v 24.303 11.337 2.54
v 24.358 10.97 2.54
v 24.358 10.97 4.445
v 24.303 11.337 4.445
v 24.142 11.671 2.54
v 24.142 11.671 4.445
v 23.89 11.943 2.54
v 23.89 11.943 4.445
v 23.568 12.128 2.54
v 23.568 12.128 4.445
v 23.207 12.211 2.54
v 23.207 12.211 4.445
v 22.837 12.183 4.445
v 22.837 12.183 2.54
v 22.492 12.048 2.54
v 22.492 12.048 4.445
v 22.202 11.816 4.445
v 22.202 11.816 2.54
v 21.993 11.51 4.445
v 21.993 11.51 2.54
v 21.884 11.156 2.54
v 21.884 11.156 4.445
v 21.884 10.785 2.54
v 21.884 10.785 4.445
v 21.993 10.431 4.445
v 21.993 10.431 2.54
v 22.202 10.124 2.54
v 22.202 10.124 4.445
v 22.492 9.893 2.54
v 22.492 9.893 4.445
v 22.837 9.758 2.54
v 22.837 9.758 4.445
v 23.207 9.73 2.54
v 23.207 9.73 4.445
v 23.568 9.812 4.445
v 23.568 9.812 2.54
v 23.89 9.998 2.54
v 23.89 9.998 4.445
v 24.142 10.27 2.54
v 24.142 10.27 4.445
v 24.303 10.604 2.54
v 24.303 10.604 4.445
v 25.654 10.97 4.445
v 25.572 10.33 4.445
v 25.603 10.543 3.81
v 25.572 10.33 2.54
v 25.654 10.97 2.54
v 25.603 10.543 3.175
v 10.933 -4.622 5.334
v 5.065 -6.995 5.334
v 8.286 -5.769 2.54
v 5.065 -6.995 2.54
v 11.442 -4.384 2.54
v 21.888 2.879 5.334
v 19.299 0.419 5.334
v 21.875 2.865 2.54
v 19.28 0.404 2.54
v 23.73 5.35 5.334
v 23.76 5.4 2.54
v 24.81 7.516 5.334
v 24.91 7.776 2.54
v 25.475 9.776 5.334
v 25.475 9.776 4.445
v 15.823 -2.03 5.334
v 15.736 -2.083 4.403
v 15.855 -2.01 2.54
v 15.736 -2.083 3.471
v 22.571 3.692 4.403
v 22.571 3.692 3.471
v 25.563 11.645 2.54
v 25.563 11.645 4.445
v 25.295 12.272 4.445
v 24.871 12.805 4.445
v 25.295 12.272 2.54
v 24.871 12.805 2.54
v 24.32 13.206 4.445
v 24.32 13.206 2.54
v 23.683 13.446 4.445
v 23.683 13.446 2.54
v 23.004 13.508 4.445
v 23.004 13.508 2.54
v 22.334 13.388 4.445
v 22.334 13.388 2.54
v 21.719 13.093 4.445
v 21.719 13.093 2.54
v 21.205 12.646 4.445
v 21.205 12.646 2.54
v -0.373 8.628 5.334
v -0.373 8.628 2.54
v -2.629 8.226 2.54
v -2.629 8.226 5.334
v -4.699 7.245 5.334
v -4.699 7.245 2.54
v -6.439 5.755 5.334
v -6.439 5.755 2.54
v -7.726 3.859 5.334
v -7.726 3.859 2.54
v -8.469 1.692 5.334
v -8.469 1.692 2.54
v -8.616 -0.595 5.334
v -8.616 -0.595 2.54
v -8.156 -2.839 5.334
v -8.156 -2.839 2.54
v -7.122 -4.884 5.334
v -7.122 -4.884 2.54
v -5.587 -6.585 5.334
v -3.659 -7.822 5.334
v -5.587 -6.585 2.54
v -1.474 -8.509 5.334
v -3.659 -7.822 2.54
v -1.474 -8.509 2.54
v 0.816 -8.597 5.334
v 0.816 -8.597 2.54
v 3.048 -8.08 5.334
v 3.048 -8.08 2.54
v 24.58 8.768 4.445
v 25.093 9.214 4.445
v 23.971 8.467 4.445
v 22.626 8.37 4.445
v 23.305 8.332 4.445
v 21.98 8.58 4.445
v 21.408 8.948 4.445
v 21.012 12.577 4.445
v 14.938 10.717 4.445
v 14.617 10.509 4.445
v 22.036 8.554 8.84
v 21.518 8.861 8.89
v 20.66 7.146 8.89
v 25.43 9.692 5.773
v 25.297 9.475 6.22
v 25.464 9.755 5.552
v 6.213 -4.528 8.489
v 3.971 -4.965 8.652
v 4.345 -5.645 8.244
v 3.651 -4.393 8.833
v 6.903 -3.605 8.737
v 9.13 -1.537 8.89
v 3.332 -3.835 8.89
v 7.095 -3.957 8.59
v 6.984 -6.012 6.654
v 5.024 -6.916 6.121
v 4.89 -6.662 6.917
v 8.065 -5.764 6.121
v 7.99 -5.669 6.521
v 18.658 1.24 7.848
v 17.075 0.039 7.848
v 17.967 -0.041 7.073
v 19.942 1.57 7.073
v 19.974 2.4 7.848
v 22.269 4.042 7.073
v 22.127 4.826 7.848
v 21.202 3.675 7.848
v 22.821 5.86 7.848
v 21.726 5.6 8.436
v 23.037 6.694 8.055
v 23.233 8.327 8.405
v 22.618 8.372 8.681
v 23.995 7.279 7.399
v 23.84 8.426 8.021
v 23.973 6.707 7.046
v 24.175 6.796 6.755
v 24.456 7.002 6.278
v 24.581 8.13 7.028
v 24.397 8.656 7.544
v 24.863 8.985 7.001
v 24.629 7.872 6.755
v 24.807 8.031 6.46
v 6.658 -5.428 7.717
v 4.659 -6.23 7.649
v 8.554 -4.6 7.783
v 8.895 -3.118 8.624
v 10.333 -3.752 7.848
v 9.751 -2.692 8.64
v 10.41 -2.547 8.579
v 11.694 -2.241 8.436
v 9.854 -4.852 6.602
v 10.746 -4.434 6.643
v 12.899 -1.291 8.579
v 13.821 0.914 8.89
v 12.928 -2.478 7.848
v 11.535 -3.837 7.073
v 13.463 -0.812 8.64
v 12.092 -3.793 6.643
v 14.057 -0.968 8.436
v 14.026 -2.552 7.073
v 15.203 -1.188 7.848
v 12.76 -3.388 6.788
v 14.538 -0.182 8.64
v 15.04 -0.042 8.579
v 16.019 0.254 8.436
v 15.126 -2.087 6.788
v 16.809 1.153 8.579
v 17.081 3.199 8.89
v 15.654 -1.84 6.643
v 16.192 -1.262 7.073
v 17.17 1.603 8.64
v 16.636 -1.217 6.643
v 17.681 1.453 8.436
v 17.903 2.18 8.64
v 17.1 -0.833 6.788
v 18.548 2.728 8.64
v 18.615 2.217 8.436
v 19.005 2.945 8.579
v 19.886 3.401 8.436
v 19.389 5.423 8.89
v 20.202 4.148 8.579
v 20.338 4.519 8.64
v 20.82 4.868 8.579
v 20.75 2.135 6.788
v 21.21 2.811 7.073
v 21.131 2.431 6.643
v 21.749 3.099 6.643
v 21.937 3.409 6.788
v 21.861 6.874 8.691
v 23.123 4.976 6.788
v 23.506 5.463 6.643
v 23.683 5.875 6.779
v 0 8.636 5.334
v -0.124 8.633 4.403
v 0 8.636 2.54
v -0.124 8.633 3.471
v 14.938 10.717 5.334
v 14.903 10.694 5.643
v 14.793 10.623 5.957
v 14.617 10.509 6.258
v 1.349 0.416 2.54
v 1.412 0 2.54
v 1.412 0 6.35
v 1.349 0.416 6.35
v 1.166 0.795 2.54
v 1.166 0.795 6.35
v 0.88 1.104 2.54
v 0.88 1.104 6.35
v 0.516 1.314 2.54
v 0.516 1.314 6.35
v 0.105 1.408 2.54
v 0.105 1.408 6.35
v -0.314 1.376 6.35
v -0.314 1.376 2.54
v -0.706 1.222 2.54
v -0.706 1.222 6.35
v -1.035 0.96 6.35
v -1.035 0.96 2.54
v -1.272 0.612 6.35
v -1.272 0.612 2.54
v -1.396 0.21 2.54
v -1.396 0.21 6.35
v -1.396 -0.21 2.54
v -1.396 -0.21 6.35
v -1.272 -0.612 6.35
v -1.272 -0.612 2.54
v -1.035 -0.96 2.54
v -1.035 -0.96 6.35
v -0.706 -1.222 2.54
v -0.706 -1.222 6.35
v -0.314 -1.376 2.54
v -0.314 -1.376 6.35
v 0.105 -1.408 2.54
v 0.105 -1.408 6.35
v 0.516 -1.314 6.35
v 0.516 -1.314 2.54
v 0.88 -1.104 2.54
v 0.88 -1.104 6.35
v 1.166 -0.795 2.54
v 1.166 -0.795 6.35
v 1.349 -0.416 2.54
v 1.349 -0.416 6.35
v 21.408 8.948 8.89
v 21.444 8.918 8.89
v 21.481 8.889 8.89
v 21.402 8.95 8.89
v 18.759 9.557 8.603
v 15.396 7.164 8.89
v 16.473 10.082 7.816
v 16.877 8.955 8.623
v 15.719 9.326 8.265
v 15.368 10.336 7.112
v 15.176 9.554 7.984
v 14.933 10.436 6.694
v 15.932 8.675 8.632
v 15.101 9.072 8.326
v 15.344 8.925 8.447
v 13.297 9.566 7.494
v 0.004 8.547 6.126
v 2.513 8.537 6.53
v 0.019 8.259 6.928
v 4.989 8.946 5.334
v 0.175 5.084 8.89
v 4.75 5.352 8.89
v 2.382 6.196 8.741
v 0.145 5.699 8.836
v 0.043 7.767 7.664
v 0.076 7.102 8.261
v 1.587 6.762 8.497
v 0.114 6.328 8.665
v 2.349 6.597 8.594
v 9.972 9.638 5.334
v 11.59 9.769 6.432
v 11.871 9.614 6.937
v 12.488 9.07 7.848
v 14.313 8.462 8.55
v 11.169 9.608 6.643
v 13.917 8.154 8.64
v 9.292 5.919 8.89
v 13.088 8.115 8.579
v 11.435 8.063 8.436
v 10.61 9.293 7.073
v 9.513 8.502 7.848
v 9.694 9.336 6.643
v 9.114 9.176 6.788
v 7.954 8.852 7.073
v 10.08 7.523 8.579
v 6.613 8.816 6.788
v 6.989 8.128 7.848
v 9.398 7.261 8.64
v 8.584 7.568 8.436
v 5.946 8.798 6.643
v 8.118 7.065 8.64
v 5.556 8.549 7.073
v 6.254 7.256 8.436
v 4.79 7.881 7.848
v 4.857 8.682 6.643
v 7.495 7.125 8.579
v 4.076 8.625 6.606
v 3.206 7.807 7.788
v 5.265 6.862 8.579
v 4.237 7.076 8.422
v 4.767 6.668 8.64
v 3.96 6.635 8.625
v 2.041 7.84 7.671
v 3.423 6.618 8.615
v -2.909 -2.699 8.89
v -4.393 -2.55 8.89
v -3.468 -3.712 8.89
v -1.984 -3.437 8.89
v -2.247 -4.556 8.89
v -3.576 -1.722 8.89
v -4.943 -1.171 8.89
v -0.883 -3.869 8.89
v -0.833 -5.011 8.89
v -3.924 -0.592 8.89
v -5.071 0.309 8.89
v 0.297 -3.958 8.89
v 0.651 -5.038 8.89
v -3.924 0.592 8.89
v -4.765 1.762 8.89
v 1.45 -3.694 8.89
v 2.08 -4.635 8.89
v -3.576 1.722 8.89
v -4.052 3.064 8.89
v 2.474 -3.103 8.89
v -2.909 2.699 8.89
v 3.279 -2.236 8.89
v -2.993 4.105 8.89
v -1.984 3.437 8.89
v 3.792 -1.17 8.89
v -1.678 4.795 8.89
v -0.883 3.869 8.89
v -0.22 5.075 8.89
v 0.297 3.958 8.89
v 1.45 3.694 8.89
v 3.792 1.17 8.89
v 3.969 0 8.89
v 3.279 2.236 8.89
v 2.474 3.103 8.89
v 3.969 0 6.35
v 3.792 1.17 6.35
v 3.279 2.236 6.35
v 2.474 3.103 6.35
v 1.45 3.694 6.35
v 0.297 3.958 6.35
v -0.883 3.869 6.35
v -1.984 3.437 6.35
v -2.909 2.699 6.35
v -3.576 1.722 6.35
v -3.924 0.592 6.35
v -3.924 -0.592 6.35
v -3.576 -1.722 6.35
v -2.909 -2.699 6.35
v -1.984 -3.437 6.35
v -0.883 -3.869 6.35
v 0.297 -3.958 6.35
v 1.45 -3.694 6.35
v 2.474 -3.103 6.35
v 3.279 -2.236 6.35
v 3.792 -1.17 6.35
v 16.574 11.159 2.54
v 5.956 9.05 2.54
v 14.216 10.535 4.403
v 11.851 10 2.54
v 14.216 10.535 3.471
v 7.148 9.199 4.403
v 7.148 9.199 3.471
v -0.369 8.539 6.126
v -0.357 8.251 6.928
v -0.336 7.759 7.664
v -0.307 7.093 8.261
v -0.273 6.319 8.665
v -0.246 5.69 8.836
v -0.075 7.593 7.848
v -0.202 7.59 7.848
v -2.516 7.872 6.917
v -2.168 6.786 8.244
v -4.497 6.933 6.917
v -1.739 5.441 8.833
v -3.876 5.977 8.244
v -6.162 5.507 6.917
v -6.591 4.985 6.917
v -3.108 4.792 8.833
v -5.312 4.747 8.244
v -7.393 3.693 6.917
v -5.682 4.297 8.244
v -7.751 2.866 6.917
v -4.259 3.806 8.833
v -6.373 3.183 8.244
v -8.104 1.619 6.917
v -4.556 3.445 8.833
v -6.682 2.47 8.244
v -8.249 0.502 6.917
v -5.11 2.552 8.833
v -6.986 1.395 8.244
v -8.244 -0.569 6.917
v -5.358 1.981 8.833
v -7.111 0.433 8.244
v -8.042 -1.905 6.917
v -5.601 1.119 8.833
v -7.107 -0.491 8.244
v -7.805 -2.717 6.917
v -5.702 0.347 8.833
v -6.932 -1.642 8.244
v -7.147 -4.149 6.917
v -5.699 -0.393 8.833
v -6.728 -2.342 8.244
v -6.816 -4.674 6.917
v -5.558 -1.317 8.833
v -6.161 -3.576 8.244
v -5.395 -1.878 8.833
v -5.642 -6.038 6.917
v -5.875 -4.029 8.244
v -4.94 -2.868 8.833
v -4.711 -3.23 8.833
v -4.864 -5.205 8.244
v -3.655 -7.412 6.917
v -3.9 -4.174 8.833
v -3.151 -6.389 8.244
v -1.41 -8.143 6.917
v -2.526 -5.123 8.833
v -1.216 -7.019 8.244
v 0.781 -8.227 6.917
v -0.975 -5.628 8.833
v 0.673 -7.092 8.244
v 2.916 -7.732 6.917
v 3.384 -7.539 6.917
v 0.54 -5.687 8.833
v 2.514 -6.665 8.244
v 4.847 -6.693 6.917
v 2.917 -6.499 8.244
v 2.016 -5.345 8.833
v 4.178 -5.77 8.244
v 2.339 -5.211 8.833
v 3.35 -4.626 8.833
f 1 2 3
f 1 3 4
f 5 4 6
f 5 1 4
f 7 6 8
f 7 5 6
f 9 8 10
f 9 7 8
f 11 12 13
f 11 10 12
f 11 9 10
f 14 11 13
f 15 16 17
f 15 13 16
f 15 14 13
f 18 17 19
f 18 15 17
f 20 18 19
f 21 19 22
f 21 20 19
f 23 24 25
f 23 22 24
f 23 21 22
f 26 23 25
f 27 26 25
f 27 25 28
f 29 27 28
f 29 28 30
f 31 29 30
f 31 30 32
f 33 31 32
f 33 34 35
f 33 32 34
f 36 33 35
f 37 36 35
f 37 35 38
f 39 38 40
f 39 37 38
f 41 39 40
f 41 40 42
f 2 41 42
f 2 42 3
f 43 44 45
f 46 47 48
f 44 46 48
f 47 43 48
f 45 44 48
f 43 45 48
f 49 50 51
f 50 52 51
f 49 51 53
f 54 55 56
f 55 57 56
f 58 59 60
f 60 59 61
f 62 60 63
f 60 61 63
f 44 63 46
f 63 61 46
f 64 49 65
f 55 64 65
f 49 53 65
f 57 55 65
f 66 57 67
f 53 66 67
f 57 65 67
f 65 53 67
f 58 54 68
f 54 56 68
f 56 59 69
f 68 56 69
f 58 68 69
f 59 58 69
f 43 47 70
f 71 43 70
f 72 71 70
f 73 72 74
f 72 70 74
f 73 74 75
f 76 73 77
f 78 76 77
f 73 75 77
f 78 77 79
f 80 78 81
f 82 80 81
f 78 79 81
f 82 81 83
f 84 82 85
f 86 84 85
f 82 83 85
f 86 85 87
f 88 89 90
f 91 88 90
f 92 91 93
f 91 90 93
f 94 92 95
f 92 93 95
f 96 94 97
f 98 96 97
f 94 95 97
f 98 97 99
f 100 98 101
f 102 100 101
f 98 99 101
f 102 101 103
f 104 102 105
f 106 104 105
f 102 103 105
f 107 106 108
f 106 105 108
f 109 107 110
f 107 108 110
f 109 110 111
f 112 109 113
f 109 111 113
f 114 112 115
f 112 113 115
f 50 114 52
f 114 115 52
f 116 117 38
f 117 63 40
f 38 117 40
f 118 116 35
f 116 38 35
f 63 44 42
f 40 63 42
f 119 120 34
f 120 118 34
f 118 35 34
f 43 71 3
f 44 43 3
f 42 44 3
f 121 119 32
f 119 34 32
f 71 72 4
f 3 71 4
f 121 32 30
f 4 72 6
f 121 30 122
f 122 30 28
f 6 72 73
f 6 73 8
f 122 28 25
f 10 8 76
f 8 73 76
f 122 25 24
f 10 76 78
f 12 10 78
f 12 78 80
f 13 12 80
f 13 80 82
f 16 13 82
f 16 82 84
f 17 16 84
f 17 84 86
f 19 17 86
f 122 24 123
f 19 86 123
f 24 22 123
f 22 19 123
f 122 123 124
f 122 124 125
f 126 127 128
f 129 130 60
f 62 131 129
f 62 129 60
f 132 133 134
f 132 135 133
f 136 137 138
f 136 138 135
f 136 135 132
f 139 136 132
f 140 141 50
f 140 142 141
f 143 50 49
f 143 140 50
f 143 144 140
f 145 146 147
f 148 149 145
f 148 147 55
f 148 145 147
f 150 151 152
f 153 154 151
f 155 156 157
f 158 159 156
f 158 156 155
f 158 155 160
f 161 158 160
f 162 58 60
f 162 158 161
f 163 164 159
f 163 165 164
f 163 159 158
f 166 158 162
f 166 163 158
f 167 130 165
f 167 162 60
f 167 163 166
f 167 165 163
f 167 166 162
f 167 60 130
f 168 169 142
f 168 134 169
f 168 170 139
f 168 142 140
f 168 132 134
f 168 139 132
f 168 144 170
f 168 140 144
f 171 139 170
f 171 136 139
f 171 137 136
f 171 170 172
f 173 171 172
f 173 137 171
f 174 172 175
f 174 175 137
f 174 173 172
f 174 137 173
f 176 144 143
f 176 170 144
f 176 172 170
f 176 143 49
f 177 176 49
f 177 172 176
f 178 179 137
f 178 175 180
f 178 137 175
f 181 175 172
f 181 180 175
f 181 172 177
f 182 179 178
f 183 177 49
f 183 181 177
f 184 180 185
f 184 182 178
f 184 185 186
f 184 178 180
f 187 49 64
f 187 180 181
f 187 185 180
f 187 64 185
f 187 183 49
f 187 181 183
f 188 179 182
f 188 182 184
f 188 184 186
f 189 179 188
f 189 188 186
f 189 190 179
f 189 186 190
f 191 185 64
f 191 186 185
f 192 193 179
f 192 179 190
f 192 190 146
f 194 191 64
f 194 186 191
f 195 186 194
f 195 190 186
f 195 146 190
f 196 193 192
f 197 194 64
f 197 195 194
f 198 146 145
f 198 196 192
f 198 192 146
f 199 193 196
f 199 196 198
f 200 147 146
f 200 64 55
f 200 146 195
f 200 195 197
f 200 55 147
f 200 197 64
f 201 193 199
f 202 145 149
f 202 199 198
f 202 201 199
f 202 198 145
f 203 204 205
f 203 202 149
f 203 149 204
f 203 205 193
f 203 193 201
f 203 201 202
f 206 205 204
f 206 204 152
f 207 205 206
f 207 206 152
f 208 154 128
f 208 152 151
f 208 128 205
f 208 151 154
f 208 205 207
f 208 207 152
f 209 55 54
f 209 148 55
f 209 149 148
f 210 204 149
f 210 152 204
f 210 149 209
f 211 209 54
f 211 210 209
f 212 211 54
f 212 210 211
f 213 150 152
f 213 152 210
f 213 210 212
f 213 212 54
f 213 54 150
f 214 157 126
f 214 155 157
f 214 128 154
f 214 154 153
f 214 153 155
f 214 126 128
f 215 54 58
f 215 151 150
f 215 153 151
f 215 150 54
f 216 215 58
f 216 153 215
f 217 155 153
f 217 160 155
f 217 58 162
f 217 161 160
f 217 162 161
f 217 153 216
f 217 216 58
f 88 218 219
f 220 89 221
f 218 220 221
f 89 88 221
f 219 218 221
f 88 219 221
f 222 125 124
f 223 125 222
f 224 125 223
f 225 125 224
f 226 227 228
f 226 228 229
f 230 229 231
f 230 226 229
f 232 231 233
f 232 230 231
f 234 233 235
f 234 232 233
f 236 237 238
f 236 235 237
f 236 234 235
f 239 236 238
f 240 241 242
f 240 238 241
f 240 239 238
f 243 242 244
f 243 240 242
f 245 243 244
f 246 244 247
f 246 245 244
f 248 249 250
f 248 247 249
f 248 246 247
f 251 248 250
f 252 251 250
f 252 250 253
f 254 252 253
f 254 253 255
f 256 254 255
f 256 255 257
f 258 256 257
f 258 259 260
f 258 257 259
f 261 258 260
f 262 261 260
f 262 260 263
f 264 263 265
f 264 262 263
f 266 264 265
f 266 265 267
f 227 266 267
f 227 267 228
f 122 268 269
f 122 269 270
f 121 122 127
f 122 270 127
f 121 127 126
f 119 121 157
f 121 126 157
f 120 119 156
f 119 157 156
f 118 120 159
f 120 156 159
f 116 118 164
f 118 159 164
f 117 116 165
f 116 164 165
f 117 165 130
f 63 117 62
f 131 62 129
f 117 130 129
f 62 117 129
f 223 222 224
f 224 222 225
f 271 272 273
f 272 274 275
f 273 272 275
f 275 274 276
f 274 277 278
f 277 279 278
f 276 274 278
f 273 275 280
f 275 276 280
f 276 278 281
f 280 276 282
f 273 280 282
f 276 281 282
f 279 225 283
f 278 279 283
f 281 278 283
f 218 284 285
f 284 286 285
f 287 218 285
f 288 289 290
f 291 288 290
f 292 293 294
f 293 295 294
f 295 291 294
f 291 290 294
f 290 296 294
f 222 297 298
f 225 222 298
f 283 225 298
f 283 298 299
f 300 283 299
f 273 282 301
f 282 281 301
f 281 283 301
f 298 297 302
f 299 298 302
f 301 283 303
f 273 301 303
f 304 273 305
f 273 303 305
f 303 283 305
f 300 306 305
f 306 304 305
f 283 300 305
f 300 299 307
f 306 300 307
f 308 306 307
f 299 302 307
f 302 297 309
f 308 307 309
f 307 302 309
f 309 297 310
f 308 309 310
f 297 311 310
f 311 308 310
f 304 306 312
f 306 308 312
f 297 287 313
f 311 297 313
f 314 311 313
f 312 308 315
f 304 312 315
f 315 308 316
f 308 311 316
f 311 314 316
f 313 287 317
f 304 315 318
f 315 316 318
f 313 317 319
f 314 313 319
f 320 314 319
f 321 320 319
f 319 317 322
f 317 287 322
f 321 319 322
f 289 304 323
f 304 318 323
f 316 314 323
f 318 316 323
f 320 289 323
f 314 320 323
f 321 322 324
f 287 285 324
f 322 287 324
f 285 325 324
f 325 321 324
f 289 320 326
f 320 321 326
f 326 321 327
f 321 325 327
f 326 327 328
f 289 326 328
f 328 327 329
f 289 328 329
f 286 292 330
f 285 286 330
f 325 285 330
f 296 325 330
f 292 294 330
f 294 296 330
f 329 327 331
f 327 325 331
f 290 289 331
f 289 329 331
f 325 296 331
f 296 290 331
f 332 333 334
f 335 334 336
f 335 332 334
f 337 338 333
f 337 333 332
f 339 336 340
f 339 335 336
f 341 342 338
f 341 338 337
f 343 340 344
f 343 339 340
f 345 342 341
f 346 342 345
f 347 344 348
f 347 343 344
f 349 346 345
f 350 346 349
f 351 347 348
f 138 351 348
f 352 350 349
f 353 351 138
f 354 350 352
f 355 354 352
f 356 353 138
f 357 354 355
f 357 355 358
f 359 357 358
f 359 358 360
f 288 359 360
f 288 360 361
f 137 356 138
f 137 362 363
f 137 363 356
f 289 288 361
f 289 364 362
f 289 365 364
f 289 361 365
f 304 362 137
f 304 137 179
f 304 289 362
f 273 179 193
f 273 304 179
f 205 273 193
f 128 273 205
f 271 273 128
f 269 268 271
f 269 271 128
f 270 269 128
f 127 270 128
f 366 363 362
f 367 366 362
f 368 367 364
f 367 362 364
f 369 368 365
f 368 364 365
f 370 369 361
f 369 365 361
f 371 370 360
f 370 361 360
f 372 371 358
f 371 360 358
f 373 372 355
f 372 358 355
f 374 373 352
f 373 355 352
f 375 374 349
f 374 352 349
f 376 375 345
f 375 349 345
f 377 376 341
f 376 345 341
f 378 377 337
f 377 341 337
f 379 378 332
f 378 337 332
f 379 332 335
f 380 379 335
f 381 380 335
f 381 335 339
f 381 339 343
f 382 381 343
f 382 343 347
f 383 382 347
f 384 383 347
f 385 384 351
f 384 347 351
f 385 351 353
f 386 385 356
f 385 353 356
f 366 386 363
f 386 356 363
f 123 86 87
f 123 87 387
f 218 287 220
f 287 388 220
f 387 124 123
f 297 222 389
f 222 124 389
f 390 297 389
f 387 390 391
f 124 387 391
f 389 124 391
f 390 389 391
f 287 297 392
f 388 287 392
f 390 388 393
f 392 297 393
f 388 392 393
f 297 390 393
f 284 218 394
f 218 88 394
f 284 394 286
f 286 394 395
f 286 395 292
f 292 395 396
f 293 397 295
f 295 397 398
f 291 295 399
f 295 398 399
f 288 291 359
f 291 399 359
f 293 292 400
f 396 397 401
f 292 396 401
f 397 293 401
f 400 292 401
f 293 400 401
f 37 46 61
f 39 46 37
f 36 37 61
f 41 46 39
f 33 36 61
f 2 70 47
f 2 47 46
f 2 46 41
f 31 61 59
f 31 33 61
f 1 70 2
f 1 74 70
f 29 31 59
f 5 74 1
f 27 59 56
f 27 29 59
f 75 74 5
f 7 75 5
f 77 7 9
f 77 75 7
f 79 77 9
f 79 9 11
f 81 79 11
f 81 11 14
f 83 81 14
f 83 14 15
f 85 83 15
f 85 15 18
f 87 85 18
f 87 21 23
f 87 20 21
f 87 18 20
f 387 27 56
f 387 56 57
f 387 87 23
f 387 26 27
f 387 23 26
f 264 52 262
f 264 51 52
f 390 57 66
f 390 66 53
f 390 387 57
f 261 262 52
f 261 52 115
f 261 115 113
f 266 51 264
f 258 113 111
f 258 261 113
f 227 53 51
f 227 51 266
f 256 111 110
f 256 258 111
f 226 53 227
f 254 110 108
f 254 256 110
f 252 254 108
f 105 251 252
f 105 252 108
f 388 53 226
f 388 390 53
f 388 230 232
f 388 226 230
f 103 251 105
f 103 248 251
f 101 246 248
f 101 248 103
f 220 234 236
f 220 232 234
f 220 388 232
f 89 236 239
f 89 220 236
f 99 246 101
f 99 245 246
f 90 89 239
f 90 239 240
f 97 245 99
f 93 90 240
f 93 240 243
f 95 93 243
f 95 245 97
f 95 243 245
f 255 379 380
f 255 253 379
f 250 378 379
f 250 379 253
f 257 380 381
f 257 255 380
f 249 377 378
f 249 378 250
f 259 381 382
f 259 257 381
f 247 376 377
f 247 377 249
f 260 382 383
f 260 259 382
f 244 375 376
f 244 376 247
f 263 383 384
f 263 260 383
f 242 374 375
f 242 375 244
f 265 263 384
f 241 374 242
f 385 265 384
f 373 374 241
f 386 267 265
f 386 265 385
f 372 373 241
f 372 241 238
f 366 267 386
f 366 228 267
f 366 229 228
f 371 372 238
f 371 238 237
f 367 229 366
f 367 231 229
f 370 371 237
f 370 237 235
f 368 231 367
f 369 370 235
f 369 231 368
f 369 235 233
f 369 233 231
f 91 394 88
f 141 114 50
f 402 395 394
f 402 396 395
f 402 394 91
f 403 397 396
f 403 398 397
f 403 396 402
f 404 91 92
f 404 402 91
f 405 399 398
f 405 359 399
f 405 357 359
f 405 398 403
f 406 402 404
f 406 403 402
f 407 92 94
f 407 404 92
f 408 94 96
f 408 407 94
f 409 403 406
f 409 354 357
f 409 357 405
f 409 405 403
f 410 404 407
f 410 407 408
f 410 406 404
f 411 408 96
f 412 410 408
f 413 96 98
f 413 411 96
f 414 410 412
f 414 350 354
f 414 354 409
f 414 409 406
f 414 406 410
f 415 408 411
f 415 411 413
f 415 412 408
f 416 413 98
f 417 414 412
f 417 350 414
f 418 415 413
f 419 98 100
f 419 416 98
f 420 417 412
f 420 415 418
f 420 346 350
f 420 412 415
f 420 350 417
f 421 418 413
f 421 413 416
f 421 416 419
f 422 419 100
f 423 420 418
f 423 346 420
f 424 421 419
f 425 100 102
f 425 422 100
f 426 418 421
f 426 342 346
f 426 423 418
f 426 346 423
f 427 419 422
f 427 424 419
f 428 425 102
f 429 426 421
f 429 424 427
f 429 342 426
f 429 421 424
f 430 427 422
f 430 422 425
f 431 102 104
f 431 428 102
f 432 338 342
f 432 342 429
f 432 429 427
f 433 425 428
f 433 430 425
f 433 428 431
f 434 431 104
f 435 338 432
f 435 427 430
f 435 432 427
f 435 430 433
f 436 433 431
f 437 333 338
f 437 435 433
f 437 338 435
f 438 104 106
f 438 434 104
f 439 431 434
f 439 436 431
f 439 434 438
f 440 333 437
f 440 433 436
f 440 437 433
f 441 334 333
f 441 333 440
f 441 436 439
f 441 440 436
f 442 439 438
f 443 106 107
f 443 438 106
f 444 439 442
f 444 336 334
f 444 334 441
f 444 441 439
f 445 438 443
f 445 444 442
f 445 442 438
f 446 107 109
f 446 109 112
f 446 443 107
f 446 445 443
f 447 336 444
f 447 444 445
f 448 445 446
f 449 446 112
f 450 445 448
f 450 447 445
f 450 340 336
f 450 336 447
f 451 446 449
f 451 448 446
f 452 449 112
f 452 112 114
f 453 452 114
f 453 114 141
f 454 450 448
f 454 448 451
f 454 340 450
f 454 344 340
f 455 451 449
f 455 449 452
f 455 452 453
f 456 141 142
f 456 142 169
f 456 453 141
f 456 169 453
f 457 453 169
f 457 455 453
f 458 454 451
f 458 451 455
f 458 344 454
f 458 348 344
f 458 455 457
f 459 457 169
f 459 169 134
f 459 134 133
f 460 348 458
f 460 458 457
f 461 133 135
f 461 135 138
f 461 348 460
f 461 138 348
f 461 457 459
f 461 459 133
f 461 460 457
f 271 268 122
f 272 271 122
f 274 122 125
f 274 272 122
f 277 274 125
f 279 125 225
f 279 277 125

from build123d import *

# Parameters (mm, degrees)
SKETCH1_R           = 1.411527177
SKETCH1_R_2         = 1.243983369
BOSS_EXTRUDE1_DEPTH = 8.89
SKETCH2_R           = 2.645579886
CUT_EXTRUDE1_DEPTH  = 4.445
FILLET1_R           = 3.556
SKETCH3_W           = 44.674996293
SKETCH3_H           = 31.668439698
CUT_EXTRUDE2_DEPTH  = 2.54
SKETCH4_R           = 3.96875
CUT_EXTRUDE3_DEPTH  = 2.54
CUT_EXTRUDE7_DEPTH  = 4.445


with BuildPart() as part:
    # Sketch1 → Boss-Extrude1 (new body)
    with BuildSketch(Plane.XY):
        with BuildLine():
            add(Edge.make_bspline(
                [(21.205268726, 12.646161991), (14.255823247, 10.148268513), (7.187400407, 8.811547849), (0, 8.636)],
                knots=[0.085210597, 0.085210597, 0.085210597, 0.085210597, 0.879863224, 0.879863224, 0.879863224, 0.879863224], degree=3))
            add(Edge.make_bspline(
                [(0, 8.636), (-0.12439204, 8.632961801), (-0.248819718, 8.630271408), (-0.373283033, 8.627928823)],
                knots=[0.879863224, 0.879863224, 0.879863224, 0.879863224, 0.893616244, 0.893616244, 0.893616244, 0.893616244], degree=3))
            ThreePointArc((-0.373283033, 8.627928823), (-8.155941991, -2.839208736), (5.065163845, -6.994613014))
            add(Edge.make_bspline(
                [(5.065163845, -6.994613014), (17.65304868, -2.514917498), (24.488656608, 3.25999298), (25.571987628, 10.33011842)],
                knots=[0.06260201, 0.06260201, 0.06260201, 0.06260201, 0.556375894, 0.556375894, 0.556375894, 0.556375894], degree=3))
            add(Edge.make_bspline(
                [(25.571987628, 10.33011842), (25.604508953, 10.542361808), (25.63184641, 10.755772424), (25.654, 10.97035027)],
                knots=[0.556375894, 0.556375894, 0.556375894, 0.556375894, 0.571198862, 0.571198862, 0.571198862, 0.571198862], degree=3))
            ThreePointArc((25.654, 10.97035027), (24.009383316, 13.347299726), (21.205268726, 12.646161991))
        make_face()
        Circle(SKETCH1_R, mode=Mode.SUBTRACT)
        with Locations((23.114, 10.97035027)):
            Circle(SKETCH1_R_2, mode=Mode.SUBTRACT)
    extrude(amount=BOSS_EXTRUDE1_DEPTH)

    # Sketch2 → Cut-Extrude1 (cut)
    with BuildSketch(Plane.XY.offset(8.89)):
        with Locations((23.114, 10.97035027)):
            Circle(SKETCH2_R)
    extrude(amount=-CUT_EXTRUDE1_DEPTH, mode=Mode.SUBTRACT)

    # Fillet1
    fillet1_edges = [part.edges().sort_by_distance(p)[0] for p in [
        (10.663514179, 9.764845798, 8.89),
        (-8.155941991, -2.839208736, 8.89),
        (17.427402091, -0.984924283, 8.89),
    ]]
    fillet(fillet1_edges, radius=FILLET1_R)

    # Sketch3 → Cut-Extrude2 (cut)
    with BuildSketch(Plane(origin=(0, 0, 0), x_dir=(-1, 0, 0), z_dir=(0, 0, -1))):
        with Locations((-8.365824592, 1.646921095)):
            Rectangle(SKETCH3_W, SKETCH3_H)
    extrude(amount=-CUT_EXTRUDE2_DEPTH, mode=Mode.SUBTRACT)

    # Sketch4 → Cut-Extrude3 (cut)
    with BuildSketch(Plane.XY.offset(8.89)):
        Circle(SKETCH4_R)
    extrude(amount=-CUT_EXTRUDE3_DEPTH, mode=Mode.SUBTRACT)

    # Sketch9 → Cut-Extrude7 (cut)
    with BuildSketch(Plane.XY.offset(8.89)):
        Polygon((21.408086702, 8.948234361), (14.616524105, 10.508926006), (20.791087942, 14.493017593), (23.324721169, 10.827396362), align=None)
    extrude(amount=-CUT_EXTRUDE7_DEPTH, mode=Mode.SUBTRACT)


solid = part.part
